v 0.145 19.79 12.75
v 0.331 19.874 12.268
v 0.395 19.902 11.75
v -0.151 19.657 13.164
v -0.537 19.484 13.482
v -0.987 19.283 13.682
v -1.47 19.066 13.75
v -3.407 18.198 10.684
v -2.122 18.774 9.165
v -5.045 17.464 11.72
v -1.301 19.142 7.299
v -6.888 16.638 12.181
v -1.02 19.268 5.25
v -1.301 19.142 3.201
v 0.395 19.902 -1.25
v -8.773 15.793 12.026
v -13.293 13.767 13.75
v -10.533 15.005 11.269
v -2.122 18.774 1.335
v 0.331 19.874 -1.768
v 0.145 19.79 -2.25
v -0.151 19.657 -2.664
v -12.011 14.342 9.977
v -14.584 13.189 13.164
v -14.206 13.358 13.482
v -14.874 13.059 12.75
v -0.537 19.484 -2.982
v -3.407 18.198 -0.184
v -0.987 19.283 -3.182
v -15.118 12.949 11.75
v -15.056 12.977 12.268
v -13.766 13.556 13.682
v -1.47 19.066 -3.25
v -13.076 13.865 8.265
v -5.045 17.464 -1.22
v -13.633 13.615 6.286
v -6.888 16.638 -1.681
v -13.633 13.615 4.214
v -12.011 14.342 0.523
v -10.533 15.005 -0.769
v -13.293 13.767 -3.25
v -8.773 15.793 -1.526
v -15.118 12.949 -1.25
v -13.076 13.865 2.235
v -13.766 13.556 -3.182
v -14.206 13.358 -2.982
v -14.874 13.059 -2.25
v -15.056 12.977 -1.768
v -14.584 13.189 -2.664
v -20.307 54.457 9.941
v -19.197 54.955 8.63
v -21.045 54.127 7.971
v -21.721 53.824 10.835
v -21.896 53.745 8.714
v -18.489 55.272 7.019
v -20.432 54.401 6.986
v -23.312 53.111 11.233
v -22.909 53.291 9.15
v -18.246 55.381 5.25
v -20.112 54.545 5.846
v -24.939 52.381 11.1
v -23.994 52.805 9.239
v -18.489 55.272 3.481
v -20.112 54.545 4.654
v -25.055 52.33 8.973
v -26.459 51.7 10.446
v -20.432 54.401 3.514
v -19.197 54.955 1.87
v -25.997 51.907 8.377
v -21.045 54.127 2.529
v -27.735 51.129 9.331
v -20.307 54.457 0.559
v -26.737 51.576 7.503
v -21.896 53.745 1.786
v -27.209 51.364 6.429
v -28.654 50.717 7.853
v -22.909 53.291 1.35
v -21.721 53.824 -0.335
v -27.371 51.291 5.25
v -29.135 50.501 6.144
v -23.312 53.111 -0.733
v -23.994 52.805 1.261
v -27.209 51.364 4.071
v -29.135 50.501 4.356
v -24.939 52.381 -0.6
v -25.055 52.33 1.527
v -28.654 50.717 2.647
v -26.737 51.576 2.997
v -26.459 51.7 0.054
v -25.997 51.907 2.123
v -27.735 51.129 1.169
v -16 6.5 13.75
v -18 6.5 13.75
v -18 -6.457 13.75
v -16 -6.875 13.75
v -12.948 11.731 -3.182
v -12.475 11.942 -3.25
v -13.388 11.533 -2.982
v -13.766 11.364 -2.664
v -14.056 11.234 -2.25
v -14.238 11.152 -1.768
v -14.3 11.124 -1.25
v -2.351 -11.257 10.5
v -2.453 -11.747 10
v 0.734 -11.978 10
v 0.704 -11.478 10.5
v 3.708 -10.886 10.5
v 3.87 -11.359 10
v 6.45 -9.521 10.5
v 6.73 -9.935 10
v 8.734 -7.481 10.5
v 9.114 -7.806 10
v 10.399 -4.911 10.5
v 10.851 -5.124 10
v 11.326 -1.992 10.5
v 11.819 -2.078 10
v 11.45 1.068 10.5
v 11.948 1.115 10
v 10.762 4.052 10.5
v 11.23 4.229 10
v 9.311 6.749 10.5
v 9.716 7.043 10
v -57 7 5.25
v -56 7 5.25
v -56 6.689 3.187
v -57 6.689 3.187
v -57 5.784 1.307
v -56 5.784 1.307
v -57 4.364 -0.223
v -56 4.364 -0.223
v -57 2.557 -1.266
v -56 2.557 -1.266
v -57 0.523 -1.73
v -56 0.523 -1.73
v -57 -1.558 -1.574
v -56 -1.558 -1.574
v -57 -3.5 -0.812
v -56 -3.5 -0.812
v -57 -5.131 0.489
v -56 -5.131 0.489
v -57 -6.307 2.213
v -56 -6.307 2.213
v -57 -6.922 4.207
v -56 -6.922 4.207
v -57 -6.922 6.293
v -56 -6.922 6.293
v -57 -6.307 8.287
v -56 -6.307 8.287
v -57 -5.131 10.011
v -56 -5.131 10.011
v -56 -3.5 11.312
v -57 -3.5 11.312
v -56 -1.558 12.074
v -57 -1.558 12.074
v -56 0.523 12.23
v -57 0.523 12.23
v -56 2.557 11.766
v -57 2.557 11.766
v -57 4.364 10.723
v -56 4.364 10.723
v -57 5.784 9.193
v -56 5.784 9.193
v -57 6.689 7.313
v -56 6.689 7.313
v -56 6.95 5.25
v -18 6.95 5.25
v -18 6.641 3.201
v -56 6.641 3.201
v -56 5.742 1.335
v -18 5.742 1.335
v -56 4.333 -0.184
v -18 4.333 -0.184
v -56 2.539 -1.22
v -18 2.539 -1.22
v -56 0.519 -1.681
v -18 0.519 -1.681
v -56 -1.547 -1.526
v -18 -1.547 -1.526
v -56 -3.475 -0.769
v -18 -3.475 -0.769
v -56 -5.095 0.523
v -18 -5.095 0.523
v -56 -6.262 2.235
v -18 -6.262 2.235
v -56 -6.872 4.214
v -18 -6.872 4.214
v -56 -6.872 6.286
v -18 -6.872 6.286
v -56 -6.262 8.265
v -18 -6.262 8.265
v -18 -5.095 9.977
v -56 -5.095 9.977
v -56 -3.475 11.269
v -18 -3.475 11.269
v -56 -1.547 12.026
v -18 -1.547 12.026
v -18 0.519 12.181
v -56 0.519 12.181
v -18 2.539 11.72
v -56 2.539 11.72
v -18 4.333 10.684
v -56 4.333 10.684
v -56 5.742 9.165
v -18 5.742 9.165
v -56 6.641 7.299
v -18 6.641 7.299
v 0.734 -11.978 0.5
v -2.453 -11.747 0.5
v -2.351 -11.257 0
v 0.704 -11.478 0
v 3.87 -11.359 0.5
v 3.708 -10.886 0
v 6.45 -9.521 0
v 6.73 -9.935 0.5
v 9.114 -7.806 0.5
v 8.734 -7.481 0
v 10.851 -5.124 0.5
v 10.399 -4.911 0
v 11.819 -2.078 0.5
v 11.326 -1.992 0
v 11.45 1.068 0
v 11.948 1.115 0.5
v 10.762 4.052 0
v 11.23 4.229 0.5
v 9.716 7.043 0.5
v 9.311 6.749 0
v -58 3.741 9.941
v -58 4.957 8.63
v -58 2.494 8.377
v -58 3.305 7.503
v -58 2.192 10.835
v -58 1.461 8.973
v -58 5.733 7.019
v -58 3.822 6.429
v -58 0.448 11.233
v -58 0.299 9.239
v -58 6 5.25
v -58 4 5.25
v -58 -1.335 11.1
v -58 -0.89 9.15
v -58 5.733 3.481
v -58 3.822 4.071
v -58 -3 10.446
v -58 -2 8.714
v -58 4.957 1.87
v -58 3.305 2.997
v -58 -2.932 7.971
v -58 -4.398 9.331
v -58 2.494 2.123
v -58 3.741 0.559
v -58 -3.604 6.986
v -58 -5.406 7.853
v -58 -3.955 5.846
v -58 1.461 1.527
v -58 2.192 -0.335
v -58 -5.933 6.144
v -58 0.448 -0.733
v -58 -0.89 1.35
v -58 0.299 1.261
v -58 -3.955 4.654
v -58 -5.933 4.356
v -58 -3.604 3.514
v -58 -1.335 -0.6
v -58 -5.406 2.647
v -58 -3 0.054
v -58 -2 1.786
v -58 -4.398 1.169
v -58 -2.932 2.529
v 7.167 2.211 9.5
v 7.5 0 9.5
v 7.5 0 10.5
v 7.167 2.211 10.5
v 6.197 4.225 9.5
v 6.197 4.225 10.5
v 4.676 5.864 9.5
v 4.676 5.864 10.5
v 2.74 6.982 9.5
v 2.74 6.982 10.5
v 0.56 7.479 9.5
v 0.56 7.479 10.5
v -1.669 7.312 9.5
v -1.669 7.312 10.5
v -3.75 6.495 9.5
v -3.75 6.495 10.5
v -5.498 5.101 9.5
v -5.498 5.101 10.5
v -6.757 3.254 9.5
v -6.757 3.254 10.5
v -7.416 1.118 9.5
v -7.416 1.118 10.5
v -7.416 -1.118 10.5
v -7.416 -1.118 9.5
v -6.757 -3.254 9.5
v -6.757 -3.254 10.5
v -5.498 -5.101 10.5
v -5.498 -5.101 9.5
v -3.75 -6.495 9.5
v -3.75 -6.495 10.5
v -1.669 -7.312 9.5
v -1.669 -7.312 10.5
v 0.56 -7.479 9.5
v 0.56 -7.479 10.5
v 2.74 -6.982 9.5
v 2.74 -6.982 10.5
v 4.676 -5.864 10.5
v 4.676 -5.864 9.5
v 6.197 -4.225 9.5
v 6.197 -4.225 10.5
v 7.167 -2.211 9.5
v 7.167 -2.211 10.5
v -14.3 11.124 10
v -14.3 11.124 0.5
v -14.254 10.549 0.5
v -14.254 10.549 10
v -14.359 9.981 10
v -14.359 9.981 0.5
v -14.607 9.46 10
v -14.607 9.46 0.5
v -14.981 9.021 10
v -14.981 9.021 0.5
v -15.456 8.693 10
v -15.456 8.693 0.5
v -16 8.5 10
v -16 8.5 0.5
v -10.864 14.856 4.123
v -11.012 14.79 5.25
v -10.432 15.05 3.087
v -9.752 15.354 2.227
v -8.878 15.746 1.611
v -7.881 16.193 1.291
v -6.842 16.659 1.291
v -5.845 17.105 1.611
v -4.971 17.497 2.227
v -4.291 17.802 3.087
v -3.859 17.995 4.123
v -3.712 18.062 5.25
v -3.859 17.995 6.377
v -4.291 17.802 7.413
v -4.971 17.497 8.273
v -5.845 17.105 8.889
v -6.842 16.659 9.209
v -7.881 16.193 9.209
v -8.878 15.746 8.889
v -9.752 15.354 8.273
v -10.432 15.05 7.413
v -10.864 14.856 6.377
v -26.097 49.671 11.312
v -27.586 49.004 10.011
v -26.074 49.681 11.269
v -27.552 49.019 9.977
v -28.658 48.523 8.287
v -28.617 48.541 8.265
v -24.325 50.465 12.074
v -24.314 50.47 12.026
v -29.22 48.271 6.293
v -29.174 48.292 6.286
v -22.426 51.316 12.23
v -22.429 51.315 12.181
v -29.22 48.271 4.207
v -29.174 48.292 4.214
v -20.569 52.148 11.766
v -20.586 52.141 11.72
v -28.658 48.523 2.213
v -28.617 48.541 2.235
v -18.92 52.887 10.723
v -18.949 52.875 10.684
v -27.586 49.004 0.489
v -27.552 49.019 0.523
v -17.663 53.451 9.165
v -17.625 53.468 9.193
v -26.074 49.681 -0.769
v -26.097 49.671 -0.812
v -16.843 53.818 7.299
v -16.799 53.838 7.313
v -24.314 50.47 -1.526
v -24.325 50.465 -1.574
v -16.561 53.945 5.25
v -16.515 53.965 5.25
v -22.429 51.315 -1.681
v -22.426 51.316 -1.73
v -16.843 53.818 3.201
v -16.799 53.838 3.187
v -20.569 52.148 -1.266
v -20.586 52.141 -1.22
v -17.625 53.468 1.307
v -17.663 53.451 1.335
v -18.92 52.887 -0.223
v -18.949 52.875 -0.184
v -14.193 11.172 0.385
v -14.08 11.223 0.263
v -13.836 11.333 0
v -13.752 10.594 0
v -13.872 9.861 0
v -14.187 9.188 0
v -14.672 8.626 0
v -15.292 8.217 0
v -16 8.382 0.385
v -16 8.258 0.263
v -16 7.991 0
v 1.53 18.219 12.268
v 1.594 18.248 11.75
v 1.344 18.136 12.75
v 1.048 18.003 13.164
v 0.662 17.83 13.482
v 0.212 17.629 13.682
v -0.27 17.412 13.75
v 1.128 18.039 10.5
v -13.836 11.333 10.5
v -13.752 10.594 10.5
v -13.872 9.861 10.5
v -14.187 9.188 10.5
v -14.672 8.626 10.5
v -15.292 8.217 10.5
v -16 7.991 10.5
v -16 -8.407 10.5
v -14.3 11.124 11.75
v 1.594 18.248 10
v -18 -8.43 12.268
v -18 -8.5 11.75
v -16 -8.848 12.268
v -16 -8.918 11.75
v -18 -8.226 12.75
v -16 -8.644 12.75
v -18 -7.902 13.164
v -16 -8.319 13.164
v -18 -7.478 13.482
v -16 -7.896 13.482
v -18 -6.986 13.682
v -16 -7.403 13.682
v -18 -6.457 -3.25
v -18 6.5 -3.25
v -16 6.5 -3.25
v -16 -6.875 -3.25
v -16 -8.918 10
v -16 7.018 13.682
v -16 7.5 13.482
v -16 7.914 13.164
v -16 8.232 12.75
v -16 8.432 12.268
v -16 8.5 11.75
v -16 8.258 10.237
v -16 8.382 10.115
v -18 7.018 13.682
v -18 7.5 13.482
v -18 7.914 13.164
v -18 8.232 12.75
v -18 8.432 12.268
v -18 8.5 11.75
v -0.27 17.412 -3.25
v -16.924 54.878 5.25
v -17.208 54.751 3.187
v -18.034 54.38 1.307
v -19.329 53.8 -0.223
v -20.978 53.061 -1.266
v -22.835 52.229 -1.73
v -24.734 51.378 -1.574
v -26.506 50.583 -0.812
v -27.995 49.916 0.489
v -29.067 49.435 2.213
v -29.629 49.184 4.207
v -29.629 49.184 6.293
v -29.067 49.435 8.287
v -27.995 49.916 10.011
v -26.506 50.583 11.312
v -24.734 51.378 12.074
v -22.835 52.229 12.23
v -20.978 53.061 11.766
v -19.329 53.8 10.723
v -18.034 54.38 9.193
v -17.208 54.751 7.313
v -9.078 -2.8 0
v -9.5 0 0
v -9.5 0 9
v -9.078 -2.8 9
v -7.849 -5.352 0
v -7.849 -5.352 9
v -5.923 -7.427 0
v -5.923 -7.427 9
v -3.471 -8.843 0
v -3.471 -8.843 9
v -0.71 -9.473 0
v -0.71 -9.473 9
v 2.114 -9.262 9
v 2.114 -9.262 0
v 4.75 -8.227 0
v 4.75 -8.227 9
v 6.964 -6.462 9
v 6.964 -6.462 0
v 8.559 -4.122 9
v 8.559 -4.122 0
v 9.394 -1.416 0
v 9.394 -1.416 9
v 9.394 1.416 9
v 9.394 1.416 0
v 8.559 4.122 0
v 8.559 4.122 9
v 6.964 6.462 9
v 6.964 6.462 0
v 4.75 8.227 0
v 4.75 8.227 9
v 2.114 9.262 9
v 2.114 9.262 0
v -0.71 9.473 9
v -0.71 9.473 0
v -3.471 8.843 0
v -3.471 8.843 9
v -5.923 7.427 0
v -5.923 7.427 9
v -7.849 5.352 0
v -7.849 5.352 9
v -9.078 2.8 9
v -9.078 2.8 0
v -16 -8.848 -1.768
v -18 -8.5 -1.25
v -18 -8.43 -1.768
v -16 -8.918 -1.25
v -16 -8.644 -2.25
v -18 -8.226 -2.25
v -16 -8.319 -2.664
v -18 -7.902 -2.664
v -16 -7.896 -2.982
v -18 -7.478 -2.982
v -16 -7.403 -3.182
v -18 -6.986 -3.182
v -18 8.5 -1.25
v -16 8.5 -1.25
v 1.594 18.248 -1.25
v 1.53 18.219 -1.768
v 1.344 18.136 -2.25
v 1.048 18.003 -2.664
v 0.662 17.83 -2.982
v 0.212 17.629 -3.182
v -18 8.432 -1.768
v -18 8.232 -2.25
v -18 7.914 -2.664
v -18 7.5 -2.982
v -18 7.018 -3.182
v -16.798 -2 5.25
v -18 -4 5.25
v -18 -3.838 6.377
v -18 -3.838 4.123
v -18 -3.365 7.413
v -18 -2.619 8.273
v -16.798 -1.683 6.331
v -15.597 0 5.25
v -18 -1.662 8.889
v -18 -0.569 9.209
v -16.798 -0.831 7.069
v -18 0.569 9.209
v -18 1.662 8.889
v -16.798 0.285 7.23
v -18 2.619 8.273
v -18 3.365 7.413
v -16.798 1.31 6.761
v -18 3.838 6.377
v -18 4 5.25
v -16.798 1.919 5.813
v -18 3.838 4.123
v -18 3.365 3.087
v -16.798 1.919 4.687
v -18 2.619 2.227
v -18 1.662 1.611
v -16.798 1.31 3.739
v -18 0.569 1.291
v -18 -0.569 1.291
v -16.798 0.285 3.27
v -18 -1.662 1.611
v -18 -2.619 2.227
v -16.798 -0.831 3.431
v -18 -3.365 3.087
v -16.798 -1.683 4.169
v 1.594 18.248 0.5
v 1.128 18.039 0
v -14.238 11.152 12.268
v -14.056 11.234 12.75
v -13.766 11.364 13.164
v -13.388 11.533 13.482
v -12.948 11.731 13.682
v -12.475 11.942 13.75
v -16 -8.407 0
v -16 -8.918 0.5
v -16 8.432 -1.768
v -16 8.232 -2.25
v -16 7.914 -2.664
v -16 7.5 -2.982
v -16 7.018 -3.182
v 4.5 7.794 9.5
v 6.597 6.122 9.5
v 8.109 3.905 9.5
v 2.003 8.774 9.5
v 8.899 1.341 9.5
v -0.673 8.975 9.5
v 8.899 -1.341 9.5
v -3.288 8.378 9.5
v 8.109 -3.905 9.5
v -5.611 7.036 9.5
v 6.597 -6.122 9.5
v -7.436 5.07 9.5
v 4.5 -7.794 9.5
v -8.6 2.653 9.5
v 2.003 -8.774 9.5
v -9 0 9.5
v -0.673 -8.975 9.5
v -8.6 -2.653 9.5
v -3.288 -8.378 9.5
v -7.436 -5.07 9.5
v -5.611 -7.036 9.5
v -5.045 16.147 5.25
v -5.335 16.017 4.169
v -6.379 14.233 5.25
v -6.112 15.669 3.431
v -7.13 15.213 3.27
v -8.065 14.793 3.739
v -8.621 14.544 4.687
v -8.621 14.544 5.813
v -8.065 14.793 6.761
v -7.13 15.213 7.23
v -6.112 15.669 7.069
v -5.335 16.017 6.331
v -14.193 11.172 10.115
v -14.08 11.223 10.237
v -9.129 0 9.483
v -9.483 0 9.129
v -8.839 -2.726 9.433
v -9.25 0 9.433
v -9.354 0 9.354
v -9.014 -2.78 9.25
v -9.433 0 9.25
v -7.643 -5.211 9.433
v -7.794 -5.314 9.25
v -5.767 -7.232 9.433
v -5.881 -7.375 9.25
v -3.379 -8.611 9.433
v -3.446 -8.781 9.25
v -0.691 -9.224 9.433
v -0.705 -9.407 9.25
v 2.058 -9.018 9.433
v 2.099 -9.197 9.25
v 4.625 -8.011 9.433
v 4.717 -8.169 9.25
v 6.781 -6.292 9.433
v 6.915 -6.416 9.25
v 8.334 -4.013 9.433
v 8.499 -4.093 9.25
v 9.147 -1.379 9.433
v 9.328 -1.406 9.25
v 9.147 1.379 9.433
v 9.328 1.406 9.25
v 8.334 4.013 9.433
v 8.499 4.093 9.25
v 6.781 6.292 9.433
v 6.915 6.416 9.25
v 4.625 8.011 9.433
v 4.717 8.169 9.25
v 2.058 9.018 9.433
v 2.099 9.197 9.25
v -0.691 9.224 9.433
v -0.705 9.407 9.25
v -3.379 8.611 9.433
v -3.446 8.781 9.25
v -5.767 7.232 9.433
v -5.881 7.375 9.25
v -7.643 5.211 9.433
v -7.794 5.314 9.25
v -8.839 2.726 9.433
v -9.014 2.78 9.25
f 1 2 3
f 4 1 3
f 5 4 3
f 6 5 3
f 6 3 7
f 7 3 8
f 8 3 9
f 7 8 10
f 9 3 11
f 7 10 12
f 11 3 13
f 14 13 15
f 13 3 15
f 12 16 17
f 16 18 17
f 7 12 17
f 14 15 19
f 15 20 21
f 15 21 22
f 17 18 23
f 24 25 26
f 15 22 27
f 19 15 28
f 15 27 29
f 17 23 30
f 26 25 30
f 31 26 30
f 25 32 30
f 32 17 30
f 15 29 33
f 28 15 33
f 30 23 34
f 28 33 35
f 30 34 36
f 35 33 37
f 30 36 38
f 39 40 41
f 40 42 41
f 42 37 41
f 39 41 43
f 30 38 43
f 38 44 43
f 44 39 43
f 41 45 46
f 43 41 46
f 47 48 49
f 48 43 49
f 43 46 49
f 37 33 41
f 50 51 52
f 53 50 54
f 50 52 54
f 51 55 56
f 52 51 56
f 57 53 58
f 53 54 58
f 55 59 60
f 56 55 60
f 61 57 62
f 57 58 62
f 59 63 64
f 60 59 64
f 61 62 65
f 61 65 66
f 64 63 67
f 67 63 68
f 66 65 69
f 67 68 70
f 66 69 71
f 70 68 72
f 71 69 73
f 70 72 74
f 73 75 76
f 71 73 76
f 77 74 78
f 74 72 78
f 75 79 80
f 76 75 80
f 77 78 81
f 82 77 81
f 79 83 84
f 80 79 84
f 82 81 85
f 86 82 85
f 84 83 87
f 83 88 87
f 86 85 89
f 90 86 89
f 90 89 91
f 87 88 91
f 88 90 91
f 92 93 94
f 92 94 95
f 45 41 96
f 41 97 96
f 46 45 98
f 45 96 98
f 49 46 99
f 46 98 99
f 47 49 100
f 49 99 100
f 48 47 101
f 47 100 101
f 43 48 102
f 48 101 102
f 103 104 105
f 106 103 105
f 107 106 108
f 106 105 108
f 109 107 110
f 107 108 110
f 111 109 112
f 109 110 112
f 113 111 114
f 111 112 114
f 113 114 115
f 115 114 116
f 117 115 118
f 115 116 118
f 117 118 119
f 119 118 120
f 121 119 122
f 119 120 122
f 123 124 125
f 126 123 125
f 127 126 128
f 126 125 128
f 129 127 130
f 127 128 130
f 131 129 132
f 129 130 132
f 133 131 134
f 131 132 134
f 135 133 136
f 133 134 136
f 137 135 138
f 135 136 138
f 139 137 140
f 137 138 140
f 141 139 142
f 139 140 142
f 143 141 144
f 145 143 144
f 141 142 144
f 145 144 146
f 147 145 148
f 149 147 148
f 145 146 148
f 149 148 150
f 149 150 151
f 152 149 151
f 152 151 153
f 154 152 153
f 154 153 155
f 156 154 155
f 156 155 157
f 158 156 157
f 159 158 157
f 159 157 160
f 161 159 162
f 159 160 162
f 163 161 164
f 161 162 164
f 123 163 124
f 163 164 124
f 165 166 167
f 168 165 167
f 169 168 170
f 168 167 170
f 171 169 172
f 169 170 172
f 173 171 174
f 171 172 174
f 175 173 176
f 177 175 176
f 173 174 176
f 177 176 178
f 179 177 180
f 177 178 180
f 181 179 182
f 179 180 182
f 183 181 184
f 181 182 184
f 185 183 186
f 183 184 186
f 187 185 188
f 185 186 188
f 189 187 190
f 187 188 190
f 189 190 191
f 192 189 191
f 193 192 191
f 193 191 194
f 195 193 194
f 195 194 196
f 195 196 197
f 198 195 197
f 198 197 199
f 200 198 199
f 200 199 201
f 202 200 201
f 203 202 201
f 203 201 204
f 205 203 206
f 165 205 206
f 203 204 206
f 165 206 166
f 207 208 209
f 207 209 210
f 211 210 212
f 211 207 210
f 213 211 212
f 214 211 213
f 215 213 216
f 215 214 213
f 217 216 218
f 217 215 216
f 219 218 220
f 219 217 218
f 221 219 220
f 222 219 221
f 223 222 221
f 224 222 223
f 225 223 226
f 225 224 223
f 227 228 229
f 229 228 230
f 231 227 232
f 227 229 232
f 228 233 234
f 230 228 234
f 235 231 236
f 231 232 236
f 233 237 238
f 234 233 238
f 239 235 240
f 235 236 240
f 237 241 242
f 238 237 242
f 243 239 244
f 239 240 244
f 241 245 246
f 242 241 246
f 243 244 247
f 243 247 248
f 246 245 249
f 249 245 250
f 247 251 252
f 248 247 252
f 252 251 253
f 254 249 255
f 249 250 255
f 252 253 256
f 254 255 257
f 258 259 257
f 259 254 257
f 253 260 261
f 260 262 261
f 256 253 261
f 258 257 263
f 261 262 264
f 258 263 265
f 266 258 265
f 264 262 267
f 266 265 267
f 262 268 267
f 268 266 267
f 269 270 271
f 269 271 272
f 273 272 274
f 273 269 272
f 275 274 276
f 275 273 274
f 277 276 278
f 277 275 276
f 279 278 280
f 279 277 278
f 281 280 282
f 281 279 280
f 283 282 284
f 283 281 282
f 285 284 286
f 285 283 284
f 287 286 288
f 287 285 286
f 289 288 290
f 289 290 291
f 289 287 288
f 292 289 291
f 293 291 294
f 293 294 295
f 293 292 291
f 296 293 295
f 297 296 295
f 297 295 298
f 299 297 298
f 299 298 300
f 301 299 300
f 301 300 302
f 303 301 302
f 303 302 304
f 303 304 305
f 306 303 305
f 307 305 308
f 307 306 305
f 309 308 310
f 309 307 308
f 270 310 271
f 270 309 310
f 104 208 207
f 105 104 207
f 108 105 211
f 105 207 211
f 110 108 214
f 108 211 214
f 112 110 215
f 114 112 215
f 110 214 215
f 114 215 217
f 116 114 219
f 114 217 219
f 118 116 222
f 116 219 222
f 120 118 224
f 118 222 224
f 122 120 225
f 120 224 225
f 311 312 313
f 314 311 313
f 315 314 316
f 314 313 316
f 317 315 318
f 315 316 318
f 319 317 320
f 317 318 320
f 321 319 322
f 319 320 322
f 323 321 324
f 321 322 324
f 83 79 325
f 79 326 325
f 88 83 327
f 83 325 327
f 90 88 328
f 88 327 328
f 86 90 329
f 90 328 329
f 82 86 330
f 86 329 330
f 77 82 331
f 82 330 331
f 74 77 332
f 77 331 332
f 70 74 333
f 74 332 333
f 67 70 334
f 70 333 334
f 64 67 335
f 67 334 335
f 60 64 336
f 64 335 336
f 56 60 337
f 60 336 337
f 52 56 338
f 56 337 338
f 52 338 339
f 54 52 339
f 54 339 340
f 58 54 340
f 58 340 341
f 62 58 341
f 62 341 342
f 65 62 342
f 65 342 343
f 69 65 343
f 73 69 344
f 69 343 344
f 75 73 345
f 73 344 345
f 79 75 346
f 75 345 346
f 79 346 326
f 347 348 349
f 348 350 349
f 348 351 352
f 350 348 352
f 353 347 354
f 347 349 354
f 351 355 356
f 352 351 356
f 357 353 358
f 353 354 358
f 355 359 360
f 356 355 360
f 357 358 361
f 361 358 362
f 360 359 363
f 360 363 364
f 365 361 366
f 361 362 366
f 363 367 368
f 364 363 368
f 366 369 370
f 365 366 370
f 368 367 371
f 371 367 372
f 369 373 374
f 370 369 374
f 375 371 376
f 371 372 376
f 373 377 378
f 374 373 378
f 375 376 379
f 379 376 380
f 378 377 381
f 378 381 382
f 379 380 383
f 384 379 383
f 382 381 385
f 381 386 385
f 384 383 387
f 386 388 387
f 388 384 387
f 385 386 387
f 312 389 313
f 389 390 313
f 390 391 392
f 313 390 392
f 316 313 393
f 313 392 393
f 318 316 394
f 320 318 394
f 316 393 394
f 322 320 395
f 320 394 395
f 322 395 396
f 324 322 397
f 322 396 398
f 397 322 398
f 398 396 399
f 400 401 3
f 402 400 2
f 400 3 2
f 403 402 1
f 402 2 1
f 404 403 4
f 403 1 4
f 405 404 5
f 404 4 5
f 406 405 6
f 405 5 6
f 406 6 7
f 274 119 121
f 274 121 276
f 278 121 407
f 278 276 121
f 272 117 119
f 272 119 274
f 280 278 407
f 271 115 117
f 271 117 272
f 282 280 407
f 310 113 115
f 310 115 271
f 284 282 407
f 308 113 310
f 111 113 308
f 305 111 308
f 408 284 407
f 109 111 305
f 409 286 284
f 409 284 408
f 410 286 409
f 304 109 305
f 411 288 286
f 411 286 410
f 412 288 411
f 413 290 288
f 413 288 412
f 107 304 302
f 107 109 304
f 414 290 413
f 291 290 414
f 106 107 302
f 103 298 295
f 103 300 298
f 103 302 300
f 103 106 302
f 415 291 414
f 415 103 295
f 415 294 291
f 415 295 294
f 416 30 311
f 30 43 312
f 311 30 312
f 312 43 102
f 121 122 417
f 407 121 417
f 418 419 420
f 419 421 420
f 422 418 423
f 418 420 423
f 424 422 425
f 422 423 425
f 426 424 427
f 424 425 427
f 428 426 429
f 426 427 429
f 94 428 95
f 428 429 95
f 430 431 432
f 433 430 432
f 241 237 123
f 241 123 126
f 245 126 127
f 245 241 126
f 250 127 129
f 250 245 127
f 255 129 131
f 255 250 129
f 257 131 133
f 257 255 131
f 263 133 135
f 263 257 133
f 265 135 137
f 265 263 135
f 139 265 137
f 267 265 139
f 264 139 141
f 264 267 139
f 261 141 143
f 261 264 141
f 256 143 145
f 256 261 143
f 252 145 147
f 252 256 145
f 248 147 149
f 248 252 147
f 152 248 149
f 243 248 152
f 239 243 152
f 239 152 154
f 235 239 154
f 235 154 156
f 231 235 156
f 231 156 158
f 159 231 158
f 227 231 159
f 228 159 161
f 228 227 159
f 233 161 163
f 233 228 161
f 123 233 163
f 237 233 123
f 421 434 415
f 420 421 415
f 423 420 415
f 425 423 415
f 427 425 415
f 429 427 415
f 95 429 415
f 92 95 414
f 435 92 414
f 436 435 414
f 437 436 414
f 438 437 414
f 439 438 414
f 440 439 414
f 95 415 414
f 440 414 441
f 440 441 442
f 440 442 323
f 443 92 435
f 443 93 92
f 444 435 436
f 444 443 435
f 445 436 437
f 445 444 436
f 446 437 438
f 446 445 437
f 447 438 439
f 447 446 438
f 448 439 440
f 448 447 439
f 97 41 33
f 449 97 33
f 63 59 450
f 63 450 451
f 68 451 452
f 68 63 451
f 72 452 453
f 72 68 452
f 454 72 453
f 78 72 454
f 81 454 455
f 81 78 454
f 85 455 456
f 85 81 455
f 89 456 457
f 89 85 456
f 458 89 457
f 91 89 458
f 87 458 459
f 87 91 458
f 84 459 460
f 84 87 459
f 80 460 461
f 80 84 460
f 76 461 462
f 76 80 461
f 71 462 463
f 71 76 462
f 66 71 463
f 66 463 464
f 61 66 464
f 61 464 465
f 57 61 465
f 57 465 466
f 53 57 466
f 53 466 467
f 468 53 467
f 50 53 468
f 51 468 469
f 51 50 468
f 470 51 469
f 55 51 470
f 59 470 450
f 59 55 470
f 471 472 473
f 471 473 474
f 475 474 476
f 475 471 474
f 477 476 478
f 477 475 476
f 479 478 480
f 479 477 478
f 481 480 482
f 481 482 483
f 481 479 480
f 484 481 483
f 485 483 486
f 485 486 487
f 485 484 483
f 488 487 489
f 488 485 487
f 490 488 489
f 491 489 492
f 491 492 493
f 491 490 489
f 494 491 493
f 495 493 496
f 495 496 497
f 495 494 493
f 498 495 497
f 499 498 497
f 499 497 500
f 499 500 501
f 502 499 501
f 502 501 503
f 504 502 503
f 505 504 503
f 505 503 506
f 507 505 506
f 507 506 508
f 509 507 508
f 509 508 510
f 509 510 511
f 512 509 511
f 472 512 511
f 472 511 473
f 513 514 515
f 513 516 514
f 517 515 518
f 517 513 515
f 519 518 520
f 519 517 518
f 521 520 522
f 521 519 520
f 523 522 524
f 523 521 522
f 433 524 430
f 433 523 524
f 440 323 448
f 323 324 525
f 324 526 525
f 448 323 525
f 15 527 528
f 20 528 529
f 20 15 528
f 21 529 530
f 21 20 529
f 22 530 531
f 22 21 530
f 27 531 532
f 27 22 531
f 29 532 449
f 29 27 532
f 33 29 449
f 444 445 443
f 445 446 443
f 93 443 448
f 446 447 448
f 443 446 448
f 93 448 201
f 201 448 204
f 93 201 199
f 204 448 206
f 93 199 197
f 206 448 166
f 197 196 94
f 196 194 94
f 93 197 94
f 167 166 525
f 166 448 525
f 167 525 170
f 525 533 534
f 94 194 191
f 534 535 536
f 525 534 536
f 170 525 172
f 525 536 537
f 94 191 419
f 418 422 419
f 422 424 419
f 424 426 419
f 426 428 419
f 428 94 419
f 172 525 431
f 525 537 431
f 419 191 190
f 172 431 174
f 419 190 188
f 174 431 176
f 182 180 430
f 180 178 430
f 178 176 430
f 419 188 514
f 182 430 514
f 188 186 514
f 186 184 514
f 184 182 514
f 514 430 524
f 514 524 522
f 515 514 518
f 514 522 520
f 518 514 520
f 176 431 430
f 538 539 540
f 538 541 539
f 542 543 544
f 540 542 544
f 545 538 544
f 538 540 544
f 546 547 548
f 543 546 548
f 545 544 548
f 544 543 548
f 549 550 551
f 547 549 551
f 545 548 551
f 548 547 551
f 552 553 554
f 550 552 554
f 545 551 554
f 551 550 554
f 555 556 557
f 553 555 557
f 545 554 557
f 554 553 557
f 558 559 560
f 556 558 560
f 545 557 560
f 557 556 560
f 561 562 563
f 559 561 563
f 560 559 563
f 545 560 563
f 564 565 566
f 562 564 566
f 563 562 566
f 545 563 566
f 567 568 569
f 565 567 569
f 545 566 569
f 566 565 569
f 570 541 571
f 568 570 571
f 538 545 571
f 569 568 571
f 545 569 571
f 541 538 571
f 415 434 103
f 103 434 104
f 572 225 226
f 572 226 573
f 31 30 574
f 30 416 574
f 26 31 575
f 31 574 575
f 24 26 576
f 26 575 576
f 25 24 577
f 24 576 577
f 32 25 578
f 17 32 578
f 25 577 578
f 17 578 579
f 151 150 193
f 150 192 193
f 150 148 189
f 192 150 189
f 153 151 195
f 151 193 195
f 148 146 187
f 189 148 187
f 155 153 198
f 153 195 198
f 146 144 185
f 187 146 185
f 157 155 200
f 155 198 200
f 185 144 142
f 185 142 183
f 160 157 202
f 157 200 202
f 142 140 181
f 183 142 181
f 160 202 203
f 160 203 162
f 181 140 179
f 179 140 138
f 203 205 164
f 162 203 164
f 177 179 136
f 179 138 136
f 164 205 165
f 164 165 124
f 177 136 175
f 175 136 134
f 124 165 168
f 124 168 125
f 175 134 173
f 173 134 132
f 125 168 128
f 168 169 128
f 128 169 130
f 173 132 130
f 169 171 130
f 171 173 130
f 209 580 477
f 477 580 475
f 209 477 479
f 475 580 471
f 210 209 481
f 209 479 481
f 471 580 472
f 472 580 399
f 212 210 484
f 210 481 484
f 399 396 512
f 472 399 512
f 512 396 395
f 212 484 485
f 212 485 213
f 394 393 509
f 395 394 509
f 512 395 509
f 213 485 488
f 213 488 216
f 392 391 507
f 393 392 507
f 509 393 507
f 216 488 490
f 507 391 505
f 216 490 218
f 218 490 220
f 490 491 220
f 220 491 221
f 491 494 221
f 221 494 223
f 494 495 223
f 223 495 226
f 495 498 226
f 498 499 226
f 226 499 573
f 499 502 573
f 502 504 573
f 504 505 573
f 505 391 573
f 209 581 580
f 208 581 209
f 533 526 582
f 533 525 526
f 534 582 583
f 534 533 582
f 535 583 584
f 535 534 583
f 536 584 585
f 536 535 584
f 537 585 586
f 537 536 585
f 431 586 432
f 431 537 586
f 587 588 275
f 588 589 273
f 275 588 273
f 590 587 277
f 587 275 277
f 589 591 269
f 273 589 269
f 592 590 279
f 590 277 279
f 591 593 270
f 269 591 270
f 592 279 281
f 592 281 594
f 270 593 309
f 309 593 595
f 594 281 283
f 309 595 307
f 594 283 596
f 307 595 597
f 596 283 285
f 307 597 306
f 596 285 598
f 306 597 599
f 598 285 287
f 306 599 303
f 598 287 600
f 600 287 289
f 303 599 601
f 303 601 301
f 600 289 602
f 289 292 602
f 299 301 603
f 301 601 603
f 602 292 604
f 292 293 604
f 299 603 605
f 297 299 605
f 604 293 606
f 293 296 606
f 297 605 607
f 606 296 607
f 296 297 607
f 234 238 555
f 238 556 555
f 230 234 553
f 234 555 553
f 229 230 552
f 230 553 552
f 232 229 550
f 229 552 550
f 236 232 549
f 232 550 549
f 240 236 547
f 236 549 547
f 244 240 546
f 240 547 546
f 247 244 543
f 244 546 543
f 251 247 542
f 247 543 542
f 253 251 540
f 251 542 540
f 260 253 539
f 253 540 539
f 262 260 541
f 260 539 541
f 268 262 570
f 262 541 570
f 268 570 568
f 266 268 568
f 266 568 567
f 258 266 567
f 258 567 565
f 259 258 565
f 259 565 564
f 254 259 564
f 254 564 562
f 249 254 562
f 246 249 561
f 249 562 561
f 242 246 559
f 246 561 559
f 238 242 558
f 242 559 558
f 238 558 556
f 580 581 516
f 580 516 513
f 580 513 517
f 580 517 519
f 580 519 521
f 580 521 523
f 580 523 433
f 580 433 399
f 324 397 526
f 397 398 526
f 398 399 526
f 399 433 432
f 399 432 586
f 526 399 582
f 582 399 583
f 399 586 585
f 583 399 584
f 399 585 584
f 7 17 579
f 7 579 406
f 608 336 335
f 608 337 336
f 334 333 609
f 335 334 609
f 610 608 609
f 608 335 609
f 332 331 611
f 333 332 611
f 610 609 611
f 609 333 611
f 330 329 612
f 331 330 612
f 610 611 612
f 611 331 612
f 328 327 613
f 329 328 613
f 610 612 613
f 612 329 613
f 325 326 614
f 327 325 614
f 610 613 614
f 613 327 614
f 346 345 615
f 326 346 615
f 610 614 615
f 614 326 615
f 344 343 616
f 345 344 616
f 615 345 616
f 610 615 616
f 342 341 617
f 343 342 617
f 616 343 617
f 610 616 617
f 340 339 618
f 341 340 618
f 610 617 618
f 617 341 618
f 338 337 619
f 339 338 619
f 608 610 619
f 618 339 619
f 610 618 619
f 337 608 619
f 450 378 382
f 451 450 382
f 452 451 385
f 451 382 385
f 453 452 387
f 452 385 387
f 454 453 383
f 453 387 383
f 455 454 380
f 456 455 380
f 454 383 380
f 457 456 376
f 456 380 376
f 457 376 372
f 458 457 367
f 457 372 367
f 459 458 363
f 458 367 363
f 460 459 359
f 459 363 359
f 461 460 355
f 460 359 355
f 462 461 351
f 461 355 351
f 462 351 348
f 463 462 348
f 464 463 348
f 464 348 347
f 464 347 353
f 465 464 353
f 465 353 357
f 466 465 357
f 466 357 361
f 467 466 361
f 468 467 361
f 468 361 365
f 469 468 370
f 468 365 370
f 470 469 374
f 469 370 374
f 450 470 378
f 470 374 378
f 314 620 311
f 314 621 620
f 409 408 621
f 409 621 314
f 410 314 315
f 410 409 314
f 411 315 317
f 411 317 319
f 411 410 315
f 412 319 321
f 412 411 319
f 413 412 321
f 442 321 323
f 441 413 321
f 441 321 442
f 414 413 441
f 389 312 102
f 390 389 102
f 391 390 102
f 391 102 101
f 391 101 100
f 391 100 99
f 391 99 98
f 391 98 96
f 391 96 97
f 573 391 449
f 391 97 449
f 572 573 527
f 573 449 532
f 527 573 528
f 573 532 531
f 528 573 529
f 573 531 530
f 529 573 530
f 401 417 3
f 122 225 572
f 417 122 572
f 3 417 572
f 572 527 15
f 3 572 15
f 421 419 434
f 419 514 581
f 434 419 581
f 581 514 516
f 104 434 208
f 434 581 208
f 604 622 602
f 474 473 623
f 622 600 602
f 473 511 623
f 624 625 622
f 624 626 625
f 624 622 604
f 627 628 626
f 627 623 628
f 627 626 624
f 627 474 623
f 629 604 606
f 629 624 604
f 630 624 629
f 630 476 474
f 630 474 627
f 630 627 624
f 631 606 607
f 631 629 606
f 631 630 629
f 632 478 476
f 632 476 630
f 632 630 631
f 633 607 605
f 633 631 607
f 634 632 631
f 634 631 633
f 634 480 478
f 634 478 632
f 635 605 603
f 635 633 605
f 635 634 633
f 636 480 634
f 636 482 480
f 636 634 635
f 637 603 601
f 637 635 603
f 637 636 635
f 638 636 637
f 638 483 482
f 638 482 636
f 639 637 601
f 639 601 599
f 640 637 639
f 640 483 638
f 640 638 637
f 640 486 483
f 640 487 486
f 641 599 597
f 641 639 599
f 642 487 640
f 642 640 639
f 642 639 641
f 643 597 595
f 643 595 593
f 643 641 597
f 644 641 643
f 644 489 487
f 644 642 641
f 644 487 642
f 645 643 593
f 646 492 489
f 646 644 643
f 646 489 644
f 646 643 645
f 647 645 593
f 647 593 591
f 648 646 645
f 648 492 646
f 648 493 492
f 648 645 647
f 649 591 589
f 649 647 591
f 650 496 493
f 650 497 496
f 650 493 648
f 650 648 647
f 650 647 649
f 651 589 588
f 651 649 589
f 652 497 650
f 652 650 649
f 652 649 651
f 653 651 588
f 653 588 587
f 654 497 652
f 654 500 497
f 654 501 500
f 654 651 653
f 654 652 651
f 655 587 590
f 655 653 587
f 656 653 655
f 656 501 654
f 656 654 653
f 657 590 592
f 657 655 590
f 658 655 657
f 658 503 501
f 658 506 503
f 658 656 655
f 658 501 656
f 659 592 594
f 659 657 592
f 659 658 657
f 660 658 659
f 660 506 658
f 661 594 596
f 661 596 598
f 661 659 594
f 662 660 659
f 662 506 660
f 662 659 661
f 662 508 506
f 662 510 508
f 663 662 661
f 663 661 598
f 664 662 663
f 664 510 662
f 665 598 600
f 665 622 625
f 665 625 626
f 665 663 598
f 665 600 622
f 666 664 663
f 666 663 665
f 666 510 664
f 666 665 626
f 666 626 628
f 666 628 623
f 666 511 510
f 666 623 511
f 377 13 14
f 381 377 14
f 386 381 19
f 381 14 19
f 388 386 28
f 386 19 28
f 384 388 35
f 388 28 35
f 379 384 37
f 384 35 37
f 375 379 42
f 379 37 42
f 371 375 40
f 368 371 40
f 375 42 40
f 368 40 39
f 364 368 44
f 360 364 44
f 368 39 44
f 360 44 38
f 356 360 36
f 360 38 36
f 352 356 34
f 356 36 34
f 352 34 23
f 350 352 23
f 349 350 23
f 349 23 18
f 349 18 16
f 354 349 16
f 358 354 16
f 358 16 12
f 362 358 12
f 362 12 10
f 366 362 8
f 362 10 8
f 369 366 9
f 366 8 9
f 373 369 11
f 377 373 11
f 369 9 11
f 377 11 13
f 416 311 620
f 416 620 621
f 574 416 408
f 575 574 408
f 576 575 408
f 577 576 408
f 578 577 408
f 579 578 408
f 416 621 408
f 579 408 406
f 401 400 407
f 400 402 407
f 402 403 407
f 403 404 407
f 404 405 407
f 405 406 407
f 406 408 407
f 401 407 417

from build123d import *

# Parameters (mm, degrees)
SZKIC1_R                         = 9.5
DODANIE_WYCI_GNI_CIE1_DEPTH      = 10.5
DODANIE_WYCI_GNI_CIE2_START      = -1
SZKIC4_R                         = 9.5
SZKIC4_R_2                       = 7.5
DODANIE_WYCI_GNI_CIE2_DEPTH      = 1
DODANIE_WYCI_GNI_CIE5_DEPTH      = 3.25
DODANIE_WYCI_GNI_CIE5_DEPTH_BACK = 13.75
ZAOKR_GLENIE1_R                  = 2
SFAZOWANIE1_SIZE                 = 0.5
ZAOKR_GLENIE2_R                  = 0.5
SFAZOWANIE2_SIZE                 = 1
OTWORY_USTALAJ_CE_8_0MM4_D       = 8
OTWORY_USTALAJ_CE_8_0MM4_DEPTH   = 40
OTWORY_USTALAJ_CE_8_0MM4_TIP     = 2.403442476110241
OTWORY_USTALAJ_CE_8_0MM2_D       = 8
OTWORY_USTALAJ_CE_8_0MM2_DEPTH   = 40
OTWORY_USTALAJ_CE_8_0MM2_TIP     = 2.403442476110241


with BuildPart() as part:
    # Szkic1 → Dodanie-wyciągnięcie1 (new body)
    with BuildSketch(Plane.XY):
        with BuildLine():
            Line((-18, -8.500000000000002), (-2.452989835267137, -11.746609760610767))
            ThreePointArc((-2.452989835267137, -11.746609760610767), (10.072083256378775, -6.523276697839391), (9.716034523496084, 7.042632543178169))
            Line((9.716034523496084, 7.042632543178169), (0.3948872336267733, 19.902112050551786))
            Line((0.3948872336267733, 19.902112050551786), (-15.118317795339578, 12.949380951965187))
            Line((-15.118317795339578, 12.949380951965187), (-14.300349430799978, 11.124298007380911))
            ThreePointArc((-14.300349430799978, 11.124298007380911), (-14.606664802217058, 9.460139845161555), (-16, 8.499999999999996))
            Line((-16, 8.499999999999996), (-18, 8.499999999999998))
            Line((-18, 8.499999999999998), (-18, -8.500000000000002))
        make_face()
        with Locations(Location((0, 0, 0), (0, 0, 180))):
            Circle(SZKIC1_R, mode=Mode.SUBTRACT)
    extrude(amount=DODANIE_WYCI_GNI_CIE1_DEPTH)

    # Szkic2 → Obrót1 (revolve)
    with BuildSketch(Plane.XY.offset(5.25), mode=Mode.PRIVATE) as obr_t1_sk:
        Polygon((-57.99999999999999, -6.94e-15), (-57.99999999999999, -7.000000000000007), (-55.99999999999999, -7.000000000000007), (-55.99999999999999, -6.950000000000007), (-18.000000000000004, -6.950000000000007), (-18, -2.2e-15), align=None)
    revolve(obr_t1_sk.sketch.rotate(Axis((0, 0, 5.25), (-1, -1.2e-16, 0)), 180), axis=Axis((0, 0, 5.25), (-1, -1.2e-16, 0)))

    # Szkic3 → Obrót2 (revolve)
    with BuildSketch(Plane.XY.offset(5.25)):
        Polygon((-23.721082571648417, 52.927405392943996), (-17.333292265603436, 55.79029466883262), (-16.515323901063837, 53.96521172424835), (-16.560950974678434, 53.94476251513487), (-1.0195520484260303, 19.26818656803362), (-7.361715280856409, 16.425746501258498), align=None)
    revolve(axis=Axis((0, 0, 5.25), (-0.4089841822698003, 0.9125414722921379, 0)))

    # Szkic4 → Dodanie-wyciągnięcie2 (add)
    with BuildSketch(Plane.XY.offset(10.5).offset(DODANIE_WYCI_GNI_CIE2_START)):
        with Locations(Location((0, 0, 0), (0, 0, 180))):
            Circle(SZKIC4_R)
        Circle(SZKIC4_R_2, mode=Mode.SUBTRACT)
    extrude(amount=DODANIE_WYCI_GNI_CIE2_DEPTH)

    # Szkic8 → Dodanie-wyciągnięcie5 (add, two sides: drawn at the far end of the back side and taken through both)
    with BuildSketch(Plane.XY.offset(10.5).offset(-DODANIE_WYCI_GNI_CIE5_DEPTH_BACK)):
        Polygon((-18, 8.499999999999998), (-18, -8.500000000000002), (-15.999999999999996, -8.917650689902482), (-16, 8.499999999999996), align=None)
        Polygon((1.5939791736338076, 18.247841631851692), (0.3948872336267733, 19.902112050551786), (-15.118317795339578, 12.949380951965187), (-14.300349430799978, 11.124298007380911), align=None)
    extrude(amount=DODANIE_WYCI_GNI_CIE5_DEPTH + DODANIE_WYCI_GNI_CIE5_DEPTH_BACK)

    # Zaokrąglenie1
    zaokr_glenie1_edges = [part.edges().sort_by_distance(p)[0] for p in [
        (-17, -8.708825344951242, -3.25),
        (-17, 8.499999999999996, -3.25),
        (-17, 8.499999999999996, 13.75),
        (-17, -8.708825344951242, 13.75),
        (0.9944332036302904, 19.07497684120174, -3.25),
        (-14.709333613069777, 12.036839479673048, -3.25),
        (-14.709333613069777, 12.036839479673048, 13.75),
        (0.9944332036302904, 19.07497684120174, 13.75),
    ]]
    fillet(zaokr_glenie1_edges, radius=ZAOKR_GLENIE1_R)

    # Sfazowanie1
    sfazowanie1_edges = [part.edges().sort_by_distance(p)[0] for p in [
        (5.655006848564945, 12.645237087514932, 0),
        (10.072083256378772, -6.523276697839393, 0),
        (-14.606664802217058, 9.460139845161555, 10.5),
        (10.072083256378772, -6.523276697839393, 10.5),
        (-9.226494917633566, -10.332130225256623, 0),
        (-9.226494917633566, -10.332130225256623, 10.5),
        (5.655006848564945, 12.645237087514932, 10.5),
        (-14.606664802217058, 9.460139845161555, 0),
    ]]
    chamfer(sfazowanie1_edges, length=SFAZOWANIE1_SIZE)

    # Zaokrąglenie2
    zaokr_glenie2_edges = [part.edges().sort_by_distance(p)[0] for p in [
        (9.5, -2.33e-15, 9.5),
    ]]
    fillet(zaokr_glenie2_edges, radius=ZAOKR_GLENIE2_R)

    # Sfazowanie2
    sfazowanie2_edges = [part.edges().sort_by_distance(p)[0] for p in [
        (-57.99999999999999, -7.000000000000007, 5.249999999999998),
        (-30.108872877693408, 50.06451611705539, 5.249999999999999),
    ]]
    chamfer(sfazowanie2_edges, length=SFAZOWANIE2_SIZE)

    # Otwory ustalające Ø8.0mm4
    with Locations(Plane(origin=(-23.721082572, 52.927405393, 5.25), x_dir=(0.912541472292, 0.40898418227, 0), z_dir=(-0.40898418227, 0.912541472292, 0))):
        with Locations((0, 0)):
            Hole(OTWORY_USTALAJ_CE_8_0MM4_D / 2, depth=OTWORY_USTALAJ_CE_8_0MM4_DEPTH)
            with Locations((0, 0, -(OTWORY_USTALAJ_CE_8_0MM4_DEPTH + OTWORY_USTALAJ_CE_8_0MM4_TIP / 2))):  # 118° drill point
                Cone(0, OTWORY_USTALAJ_CE_8_0MM4_D / 2, OTWORY_USTALAJ_CE_8_0MM4_TIP, mode=Mode.SUBTRACT)

    # Otwory ustalające Ø8.0mm2
    with Locations(Plane(origin=(-58, 0, 5.25), x_dir=(0, -1, 0), z_dir=(-1, 0, 0))):
        with Locations((0, 0)):
            Hole(OTWORY_USTALAJ_CE_8_0MM2_D / 2, depth=OTWORY_USTALAJ_CE_8_0MM2_DEPTH)
            with Locations((0, 0, -(OTWORY_USTALAJ_CE_8_0MM2_DEPTH + OTWORY_USTALAJ_CE_8_0MM2_TIP / 2))):  # 118° drill point
                Cone(0, OTWORY_USTALAJ_CE_8_0MM2_D / 2, OTWORY_USTALAJ_CE_8_0MM2_TIP, mode=Mode.SUBTRACT)


solid = part.part
